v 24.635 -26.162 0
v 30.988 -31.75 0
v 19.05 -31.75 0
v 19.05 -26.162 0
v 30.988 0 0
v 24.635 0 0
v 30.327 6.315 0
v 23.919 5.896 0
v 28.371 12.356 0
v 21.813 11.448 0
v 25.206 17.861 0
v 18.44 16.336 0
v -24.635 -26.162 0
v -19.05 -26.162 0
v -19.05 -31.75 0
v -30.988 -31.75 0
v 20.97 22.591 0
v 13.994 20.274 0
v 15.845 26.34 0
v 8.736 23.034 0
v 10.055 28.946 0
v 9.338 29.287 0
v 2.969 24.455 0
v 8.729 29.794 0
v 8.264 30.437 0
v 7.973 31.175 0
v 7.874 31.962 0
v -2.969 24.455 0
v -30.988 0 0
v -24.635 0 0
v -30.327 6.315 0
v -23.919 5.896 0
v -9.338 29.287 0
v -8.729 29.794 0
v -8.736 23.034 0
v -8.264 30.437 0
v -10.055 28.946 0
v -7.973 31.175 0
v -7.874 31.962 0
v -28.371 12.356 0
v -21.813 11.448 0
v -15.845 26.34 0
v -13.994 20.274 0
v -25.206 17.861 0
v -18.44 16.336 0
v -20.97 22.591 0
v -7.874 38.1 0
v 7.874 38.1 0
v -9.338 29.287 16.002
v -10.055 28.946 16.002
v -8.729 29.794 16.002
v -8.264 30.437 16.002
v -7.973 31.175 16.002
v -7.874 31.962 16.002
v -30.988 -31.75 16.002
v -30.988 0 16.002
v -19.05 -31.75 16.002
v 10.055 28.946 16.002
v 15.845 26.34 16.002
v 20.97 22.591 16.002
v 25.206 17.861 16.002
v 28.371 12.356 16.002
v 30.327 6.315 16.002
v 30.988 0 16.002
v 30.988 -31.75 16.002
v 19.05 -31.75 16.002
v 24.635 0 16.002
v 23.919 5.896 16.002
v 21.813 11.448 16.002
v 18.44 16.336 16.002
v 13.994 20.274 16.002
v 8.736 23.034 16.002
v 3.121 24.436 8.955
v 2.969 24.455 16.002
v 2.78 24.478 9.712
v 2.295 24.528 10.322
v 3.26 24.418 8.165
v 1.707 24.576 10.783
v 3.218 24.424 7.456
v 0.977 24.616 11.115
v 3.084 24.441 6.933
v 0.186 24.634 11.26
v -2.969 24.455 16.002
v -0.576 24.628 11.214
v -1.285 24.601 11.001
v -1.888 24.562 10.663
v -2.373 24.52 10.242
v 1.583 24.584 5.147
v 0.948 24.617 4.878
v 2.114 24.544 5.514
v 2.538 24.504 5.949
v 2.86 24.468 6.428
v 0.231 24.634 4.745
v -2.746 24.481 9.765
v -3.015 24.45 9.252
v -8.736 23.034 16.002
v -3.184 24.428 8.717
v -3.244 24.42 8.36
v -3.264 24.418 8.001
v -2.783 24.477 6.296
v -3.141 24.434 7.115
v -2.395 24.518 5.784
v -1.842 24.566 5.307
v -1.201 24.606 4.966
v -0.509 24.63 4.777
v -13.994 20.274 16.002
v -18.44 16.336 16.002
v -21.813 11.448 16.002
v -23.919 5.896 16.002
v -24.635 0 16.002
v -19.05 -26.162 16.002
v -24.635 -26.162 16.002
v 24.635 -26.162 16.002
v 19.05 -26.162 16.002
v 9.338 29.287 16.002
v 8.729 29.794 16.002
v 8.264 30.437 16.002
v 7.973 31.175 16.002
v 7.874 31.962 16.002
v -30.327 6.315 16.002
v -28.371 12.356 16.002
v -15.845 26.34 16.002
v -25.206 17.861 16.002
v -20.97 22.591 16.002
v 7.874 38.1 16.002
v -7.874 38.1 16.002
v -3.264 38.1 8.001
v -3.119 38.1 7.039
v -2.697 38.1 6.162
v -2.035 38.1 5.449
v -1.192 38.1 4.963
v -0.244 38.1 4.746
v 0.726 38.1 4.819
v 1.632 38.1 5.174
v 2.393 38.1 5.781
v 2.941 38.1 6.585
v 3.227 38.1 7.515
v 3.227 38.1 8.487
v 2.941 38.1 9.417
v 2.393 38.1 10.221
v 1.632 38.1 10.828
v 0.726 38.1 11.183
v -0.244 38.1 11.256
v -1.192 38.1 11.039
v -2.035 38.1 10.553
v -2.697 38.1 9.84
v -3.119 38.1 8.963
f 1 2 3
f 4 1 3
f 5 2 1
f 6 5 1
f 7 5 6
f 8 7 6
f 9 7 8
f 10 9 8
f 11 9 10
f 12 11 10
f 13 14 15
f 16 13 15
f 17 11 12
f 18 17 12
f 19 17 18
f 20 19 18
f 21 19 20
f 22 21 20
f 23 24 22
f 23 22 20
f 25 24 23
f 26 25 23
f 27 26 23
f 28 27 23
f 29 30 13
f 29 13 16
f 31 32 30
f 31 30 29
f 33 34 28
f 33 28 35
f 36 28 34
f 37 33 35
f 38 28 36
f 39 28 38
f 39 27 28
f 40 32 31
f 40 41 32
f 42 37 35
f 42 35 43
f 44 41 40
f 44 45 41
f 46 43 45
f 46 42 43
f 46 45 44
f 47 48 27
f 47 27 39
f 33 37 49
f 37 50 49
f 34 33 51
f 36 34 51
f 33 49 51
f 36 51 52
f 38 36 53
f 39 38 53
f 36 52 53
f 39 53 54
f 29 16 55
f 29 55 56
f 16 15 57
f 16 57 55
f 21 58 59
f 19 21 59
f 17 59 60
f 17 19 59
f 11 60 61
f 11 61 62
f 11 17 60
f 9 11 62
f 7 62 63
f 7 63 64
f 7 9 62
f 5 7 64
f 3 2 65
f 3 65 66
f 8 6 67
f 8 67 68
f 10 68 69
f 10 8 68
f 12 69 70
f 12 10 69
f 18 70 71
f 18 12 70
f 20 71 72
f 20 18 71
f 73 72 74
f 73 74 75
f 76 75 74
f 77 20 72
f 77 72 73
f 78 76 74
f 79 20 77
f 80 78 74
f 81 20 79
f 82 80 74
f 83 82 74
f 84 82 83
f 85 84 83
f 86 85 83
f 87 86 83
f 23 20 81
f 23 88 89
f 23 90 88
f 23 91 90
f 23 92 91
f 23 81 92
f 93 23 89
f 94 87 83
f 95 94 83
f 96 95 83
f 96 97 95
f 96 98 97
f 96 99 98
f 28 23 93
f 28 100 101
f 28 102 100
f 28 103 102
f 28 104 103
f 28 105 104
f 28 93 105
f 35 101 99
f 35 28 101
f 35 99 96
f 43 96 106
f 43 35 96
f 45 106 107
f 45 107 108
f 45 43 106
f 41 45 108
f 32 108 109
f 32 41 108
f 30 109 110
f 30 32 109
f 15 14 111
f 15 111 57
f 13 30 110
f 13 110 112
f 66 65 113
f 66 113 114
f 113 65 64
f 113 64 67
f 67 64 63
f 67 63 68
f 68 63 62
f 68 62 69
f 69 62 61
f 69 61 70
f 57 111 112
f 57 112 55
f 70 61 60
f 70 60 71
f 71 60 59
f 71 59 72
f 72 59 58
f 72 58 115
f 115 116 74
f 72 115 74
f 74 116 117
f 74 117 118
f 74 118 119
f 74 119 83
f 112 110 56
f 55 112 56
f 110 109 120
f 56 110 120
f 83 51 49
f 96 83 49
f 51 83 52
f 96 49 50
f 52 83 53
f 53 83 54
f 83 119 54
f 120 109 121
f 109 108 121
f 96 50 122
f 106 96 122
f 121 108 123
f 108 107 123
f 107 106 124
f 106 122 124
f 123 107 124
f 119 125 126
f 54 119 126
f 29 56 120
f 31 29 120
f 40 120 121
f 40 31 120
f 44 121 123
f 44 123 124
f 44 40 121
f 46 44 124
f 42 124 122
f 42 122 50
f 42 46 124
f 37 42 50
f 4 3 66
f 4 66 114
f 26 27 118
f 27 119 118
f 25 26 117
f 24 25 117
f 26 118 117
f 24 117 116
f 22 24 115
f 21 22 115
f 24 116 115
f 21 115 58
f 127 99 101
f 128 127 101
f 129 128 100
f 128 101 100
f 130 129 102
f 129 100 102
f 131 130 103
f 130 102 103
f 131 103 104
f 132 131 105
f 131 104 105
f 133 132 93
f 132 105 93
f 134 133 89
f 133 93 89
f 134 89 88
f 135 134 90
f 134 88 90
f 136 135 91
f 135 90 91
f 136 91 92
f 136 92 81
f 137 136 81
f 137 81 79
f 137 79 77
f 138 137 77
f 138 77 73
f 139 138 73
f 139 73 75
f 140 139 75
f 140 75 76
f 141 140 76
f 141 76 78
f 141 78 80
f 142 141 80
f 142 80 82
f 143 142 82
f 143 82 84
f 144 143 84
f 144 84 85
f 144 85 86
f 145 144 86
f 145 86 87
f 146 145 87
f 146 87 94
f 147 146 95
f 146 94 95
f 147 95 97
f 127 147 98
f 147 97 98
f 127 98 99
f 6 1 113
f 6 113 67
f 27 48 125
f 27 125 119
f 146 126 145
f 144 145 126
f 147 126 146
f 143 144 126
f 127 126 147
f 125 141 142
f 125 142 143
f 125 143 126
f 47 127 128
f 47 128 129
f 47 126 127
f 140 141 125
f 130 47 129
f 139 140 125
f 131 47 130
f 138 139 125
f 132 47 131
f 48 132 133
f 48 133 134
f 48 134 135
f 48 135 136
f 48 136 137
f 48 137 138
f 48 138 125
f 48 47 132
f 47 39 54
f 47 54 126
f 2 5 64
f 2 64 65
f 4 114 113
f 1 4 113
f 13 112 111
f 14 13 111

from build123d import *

# Parameters (mm, degrees)
BOSS_EXTRUDE1_DEPTH      = 16.002
FILLET1_R                = 3.175
F_5_16_18_TAPPED_HOLE1_D = 6.5278


with BuildPart() as part:
    # Sketch2 → Boss-Extrude1 (new body)
    with BuildSketch(Plane.XY):
        with BuildLine():
            Line((-24.634929355, 0), (-24.634929355, -26.162))
            Line((-24.634929355, -26.162), (-19.05, -26.162))
            Line((-19.05, -26.162), (-19.05, -31.75))
            Line((-19.05, -31.75), (-30.988, -31.75))
            Line((-30.988, -31.75), (-30.988, 0))
            ThreePointArc((-30.988, 0), (-24.5240996, 18.768520453), (-7.874, 29.576552267))
            Line((-7.874, 29.576552267), (-7.874, 38.1))
            Line((-7.874, 38.1), (7.874, 38.1))
            Line((7.874, 38.1), (7.874, 29.576552267))
            ThreePointArc((7.874, 29.576552267), (24.5240996, 18.768520453), (30.988, 0))
            Line((30.988, 0), (30.988, -31.75))
            Line((30.988, -31.75), (19.05, -31.75))
            Line((19.05, -31.75), (19.05, -26.162))
            Line((19.05, -26.162), (24.634929355, -26.162))
            Line((24.634929355, -26.162), (24.634929355, 0))
            ThreePointArc((24.634929355, 0), (0, 24.634929355), (-24.634929355, 0))
        make_face()
    extrude(amount=BOSS_EXTRUDE1_DEPTH)

    # Fillet1
    fillet1_edges = [part.edges().sort_by_distance(p)[0] for p in [
        (-7.874, 29.576552267, 8.001),
        (7.874, 29.576552267, 8.001),
    ]]
    fillet(fillet1_edges, radius=FILLET1_R)

    # 5/16-18 Tapped Hole1 (through all)
    with Locations(Plane(origin=(0, 38.1, 0), x_dir=(1, 0, 0), z_dir=(0, 1, 0))):
        with Locations((0, -8.001)):
            Hole(F_5_16_18_TAPPED_HOLE1_D / 2)


solid = part.part
